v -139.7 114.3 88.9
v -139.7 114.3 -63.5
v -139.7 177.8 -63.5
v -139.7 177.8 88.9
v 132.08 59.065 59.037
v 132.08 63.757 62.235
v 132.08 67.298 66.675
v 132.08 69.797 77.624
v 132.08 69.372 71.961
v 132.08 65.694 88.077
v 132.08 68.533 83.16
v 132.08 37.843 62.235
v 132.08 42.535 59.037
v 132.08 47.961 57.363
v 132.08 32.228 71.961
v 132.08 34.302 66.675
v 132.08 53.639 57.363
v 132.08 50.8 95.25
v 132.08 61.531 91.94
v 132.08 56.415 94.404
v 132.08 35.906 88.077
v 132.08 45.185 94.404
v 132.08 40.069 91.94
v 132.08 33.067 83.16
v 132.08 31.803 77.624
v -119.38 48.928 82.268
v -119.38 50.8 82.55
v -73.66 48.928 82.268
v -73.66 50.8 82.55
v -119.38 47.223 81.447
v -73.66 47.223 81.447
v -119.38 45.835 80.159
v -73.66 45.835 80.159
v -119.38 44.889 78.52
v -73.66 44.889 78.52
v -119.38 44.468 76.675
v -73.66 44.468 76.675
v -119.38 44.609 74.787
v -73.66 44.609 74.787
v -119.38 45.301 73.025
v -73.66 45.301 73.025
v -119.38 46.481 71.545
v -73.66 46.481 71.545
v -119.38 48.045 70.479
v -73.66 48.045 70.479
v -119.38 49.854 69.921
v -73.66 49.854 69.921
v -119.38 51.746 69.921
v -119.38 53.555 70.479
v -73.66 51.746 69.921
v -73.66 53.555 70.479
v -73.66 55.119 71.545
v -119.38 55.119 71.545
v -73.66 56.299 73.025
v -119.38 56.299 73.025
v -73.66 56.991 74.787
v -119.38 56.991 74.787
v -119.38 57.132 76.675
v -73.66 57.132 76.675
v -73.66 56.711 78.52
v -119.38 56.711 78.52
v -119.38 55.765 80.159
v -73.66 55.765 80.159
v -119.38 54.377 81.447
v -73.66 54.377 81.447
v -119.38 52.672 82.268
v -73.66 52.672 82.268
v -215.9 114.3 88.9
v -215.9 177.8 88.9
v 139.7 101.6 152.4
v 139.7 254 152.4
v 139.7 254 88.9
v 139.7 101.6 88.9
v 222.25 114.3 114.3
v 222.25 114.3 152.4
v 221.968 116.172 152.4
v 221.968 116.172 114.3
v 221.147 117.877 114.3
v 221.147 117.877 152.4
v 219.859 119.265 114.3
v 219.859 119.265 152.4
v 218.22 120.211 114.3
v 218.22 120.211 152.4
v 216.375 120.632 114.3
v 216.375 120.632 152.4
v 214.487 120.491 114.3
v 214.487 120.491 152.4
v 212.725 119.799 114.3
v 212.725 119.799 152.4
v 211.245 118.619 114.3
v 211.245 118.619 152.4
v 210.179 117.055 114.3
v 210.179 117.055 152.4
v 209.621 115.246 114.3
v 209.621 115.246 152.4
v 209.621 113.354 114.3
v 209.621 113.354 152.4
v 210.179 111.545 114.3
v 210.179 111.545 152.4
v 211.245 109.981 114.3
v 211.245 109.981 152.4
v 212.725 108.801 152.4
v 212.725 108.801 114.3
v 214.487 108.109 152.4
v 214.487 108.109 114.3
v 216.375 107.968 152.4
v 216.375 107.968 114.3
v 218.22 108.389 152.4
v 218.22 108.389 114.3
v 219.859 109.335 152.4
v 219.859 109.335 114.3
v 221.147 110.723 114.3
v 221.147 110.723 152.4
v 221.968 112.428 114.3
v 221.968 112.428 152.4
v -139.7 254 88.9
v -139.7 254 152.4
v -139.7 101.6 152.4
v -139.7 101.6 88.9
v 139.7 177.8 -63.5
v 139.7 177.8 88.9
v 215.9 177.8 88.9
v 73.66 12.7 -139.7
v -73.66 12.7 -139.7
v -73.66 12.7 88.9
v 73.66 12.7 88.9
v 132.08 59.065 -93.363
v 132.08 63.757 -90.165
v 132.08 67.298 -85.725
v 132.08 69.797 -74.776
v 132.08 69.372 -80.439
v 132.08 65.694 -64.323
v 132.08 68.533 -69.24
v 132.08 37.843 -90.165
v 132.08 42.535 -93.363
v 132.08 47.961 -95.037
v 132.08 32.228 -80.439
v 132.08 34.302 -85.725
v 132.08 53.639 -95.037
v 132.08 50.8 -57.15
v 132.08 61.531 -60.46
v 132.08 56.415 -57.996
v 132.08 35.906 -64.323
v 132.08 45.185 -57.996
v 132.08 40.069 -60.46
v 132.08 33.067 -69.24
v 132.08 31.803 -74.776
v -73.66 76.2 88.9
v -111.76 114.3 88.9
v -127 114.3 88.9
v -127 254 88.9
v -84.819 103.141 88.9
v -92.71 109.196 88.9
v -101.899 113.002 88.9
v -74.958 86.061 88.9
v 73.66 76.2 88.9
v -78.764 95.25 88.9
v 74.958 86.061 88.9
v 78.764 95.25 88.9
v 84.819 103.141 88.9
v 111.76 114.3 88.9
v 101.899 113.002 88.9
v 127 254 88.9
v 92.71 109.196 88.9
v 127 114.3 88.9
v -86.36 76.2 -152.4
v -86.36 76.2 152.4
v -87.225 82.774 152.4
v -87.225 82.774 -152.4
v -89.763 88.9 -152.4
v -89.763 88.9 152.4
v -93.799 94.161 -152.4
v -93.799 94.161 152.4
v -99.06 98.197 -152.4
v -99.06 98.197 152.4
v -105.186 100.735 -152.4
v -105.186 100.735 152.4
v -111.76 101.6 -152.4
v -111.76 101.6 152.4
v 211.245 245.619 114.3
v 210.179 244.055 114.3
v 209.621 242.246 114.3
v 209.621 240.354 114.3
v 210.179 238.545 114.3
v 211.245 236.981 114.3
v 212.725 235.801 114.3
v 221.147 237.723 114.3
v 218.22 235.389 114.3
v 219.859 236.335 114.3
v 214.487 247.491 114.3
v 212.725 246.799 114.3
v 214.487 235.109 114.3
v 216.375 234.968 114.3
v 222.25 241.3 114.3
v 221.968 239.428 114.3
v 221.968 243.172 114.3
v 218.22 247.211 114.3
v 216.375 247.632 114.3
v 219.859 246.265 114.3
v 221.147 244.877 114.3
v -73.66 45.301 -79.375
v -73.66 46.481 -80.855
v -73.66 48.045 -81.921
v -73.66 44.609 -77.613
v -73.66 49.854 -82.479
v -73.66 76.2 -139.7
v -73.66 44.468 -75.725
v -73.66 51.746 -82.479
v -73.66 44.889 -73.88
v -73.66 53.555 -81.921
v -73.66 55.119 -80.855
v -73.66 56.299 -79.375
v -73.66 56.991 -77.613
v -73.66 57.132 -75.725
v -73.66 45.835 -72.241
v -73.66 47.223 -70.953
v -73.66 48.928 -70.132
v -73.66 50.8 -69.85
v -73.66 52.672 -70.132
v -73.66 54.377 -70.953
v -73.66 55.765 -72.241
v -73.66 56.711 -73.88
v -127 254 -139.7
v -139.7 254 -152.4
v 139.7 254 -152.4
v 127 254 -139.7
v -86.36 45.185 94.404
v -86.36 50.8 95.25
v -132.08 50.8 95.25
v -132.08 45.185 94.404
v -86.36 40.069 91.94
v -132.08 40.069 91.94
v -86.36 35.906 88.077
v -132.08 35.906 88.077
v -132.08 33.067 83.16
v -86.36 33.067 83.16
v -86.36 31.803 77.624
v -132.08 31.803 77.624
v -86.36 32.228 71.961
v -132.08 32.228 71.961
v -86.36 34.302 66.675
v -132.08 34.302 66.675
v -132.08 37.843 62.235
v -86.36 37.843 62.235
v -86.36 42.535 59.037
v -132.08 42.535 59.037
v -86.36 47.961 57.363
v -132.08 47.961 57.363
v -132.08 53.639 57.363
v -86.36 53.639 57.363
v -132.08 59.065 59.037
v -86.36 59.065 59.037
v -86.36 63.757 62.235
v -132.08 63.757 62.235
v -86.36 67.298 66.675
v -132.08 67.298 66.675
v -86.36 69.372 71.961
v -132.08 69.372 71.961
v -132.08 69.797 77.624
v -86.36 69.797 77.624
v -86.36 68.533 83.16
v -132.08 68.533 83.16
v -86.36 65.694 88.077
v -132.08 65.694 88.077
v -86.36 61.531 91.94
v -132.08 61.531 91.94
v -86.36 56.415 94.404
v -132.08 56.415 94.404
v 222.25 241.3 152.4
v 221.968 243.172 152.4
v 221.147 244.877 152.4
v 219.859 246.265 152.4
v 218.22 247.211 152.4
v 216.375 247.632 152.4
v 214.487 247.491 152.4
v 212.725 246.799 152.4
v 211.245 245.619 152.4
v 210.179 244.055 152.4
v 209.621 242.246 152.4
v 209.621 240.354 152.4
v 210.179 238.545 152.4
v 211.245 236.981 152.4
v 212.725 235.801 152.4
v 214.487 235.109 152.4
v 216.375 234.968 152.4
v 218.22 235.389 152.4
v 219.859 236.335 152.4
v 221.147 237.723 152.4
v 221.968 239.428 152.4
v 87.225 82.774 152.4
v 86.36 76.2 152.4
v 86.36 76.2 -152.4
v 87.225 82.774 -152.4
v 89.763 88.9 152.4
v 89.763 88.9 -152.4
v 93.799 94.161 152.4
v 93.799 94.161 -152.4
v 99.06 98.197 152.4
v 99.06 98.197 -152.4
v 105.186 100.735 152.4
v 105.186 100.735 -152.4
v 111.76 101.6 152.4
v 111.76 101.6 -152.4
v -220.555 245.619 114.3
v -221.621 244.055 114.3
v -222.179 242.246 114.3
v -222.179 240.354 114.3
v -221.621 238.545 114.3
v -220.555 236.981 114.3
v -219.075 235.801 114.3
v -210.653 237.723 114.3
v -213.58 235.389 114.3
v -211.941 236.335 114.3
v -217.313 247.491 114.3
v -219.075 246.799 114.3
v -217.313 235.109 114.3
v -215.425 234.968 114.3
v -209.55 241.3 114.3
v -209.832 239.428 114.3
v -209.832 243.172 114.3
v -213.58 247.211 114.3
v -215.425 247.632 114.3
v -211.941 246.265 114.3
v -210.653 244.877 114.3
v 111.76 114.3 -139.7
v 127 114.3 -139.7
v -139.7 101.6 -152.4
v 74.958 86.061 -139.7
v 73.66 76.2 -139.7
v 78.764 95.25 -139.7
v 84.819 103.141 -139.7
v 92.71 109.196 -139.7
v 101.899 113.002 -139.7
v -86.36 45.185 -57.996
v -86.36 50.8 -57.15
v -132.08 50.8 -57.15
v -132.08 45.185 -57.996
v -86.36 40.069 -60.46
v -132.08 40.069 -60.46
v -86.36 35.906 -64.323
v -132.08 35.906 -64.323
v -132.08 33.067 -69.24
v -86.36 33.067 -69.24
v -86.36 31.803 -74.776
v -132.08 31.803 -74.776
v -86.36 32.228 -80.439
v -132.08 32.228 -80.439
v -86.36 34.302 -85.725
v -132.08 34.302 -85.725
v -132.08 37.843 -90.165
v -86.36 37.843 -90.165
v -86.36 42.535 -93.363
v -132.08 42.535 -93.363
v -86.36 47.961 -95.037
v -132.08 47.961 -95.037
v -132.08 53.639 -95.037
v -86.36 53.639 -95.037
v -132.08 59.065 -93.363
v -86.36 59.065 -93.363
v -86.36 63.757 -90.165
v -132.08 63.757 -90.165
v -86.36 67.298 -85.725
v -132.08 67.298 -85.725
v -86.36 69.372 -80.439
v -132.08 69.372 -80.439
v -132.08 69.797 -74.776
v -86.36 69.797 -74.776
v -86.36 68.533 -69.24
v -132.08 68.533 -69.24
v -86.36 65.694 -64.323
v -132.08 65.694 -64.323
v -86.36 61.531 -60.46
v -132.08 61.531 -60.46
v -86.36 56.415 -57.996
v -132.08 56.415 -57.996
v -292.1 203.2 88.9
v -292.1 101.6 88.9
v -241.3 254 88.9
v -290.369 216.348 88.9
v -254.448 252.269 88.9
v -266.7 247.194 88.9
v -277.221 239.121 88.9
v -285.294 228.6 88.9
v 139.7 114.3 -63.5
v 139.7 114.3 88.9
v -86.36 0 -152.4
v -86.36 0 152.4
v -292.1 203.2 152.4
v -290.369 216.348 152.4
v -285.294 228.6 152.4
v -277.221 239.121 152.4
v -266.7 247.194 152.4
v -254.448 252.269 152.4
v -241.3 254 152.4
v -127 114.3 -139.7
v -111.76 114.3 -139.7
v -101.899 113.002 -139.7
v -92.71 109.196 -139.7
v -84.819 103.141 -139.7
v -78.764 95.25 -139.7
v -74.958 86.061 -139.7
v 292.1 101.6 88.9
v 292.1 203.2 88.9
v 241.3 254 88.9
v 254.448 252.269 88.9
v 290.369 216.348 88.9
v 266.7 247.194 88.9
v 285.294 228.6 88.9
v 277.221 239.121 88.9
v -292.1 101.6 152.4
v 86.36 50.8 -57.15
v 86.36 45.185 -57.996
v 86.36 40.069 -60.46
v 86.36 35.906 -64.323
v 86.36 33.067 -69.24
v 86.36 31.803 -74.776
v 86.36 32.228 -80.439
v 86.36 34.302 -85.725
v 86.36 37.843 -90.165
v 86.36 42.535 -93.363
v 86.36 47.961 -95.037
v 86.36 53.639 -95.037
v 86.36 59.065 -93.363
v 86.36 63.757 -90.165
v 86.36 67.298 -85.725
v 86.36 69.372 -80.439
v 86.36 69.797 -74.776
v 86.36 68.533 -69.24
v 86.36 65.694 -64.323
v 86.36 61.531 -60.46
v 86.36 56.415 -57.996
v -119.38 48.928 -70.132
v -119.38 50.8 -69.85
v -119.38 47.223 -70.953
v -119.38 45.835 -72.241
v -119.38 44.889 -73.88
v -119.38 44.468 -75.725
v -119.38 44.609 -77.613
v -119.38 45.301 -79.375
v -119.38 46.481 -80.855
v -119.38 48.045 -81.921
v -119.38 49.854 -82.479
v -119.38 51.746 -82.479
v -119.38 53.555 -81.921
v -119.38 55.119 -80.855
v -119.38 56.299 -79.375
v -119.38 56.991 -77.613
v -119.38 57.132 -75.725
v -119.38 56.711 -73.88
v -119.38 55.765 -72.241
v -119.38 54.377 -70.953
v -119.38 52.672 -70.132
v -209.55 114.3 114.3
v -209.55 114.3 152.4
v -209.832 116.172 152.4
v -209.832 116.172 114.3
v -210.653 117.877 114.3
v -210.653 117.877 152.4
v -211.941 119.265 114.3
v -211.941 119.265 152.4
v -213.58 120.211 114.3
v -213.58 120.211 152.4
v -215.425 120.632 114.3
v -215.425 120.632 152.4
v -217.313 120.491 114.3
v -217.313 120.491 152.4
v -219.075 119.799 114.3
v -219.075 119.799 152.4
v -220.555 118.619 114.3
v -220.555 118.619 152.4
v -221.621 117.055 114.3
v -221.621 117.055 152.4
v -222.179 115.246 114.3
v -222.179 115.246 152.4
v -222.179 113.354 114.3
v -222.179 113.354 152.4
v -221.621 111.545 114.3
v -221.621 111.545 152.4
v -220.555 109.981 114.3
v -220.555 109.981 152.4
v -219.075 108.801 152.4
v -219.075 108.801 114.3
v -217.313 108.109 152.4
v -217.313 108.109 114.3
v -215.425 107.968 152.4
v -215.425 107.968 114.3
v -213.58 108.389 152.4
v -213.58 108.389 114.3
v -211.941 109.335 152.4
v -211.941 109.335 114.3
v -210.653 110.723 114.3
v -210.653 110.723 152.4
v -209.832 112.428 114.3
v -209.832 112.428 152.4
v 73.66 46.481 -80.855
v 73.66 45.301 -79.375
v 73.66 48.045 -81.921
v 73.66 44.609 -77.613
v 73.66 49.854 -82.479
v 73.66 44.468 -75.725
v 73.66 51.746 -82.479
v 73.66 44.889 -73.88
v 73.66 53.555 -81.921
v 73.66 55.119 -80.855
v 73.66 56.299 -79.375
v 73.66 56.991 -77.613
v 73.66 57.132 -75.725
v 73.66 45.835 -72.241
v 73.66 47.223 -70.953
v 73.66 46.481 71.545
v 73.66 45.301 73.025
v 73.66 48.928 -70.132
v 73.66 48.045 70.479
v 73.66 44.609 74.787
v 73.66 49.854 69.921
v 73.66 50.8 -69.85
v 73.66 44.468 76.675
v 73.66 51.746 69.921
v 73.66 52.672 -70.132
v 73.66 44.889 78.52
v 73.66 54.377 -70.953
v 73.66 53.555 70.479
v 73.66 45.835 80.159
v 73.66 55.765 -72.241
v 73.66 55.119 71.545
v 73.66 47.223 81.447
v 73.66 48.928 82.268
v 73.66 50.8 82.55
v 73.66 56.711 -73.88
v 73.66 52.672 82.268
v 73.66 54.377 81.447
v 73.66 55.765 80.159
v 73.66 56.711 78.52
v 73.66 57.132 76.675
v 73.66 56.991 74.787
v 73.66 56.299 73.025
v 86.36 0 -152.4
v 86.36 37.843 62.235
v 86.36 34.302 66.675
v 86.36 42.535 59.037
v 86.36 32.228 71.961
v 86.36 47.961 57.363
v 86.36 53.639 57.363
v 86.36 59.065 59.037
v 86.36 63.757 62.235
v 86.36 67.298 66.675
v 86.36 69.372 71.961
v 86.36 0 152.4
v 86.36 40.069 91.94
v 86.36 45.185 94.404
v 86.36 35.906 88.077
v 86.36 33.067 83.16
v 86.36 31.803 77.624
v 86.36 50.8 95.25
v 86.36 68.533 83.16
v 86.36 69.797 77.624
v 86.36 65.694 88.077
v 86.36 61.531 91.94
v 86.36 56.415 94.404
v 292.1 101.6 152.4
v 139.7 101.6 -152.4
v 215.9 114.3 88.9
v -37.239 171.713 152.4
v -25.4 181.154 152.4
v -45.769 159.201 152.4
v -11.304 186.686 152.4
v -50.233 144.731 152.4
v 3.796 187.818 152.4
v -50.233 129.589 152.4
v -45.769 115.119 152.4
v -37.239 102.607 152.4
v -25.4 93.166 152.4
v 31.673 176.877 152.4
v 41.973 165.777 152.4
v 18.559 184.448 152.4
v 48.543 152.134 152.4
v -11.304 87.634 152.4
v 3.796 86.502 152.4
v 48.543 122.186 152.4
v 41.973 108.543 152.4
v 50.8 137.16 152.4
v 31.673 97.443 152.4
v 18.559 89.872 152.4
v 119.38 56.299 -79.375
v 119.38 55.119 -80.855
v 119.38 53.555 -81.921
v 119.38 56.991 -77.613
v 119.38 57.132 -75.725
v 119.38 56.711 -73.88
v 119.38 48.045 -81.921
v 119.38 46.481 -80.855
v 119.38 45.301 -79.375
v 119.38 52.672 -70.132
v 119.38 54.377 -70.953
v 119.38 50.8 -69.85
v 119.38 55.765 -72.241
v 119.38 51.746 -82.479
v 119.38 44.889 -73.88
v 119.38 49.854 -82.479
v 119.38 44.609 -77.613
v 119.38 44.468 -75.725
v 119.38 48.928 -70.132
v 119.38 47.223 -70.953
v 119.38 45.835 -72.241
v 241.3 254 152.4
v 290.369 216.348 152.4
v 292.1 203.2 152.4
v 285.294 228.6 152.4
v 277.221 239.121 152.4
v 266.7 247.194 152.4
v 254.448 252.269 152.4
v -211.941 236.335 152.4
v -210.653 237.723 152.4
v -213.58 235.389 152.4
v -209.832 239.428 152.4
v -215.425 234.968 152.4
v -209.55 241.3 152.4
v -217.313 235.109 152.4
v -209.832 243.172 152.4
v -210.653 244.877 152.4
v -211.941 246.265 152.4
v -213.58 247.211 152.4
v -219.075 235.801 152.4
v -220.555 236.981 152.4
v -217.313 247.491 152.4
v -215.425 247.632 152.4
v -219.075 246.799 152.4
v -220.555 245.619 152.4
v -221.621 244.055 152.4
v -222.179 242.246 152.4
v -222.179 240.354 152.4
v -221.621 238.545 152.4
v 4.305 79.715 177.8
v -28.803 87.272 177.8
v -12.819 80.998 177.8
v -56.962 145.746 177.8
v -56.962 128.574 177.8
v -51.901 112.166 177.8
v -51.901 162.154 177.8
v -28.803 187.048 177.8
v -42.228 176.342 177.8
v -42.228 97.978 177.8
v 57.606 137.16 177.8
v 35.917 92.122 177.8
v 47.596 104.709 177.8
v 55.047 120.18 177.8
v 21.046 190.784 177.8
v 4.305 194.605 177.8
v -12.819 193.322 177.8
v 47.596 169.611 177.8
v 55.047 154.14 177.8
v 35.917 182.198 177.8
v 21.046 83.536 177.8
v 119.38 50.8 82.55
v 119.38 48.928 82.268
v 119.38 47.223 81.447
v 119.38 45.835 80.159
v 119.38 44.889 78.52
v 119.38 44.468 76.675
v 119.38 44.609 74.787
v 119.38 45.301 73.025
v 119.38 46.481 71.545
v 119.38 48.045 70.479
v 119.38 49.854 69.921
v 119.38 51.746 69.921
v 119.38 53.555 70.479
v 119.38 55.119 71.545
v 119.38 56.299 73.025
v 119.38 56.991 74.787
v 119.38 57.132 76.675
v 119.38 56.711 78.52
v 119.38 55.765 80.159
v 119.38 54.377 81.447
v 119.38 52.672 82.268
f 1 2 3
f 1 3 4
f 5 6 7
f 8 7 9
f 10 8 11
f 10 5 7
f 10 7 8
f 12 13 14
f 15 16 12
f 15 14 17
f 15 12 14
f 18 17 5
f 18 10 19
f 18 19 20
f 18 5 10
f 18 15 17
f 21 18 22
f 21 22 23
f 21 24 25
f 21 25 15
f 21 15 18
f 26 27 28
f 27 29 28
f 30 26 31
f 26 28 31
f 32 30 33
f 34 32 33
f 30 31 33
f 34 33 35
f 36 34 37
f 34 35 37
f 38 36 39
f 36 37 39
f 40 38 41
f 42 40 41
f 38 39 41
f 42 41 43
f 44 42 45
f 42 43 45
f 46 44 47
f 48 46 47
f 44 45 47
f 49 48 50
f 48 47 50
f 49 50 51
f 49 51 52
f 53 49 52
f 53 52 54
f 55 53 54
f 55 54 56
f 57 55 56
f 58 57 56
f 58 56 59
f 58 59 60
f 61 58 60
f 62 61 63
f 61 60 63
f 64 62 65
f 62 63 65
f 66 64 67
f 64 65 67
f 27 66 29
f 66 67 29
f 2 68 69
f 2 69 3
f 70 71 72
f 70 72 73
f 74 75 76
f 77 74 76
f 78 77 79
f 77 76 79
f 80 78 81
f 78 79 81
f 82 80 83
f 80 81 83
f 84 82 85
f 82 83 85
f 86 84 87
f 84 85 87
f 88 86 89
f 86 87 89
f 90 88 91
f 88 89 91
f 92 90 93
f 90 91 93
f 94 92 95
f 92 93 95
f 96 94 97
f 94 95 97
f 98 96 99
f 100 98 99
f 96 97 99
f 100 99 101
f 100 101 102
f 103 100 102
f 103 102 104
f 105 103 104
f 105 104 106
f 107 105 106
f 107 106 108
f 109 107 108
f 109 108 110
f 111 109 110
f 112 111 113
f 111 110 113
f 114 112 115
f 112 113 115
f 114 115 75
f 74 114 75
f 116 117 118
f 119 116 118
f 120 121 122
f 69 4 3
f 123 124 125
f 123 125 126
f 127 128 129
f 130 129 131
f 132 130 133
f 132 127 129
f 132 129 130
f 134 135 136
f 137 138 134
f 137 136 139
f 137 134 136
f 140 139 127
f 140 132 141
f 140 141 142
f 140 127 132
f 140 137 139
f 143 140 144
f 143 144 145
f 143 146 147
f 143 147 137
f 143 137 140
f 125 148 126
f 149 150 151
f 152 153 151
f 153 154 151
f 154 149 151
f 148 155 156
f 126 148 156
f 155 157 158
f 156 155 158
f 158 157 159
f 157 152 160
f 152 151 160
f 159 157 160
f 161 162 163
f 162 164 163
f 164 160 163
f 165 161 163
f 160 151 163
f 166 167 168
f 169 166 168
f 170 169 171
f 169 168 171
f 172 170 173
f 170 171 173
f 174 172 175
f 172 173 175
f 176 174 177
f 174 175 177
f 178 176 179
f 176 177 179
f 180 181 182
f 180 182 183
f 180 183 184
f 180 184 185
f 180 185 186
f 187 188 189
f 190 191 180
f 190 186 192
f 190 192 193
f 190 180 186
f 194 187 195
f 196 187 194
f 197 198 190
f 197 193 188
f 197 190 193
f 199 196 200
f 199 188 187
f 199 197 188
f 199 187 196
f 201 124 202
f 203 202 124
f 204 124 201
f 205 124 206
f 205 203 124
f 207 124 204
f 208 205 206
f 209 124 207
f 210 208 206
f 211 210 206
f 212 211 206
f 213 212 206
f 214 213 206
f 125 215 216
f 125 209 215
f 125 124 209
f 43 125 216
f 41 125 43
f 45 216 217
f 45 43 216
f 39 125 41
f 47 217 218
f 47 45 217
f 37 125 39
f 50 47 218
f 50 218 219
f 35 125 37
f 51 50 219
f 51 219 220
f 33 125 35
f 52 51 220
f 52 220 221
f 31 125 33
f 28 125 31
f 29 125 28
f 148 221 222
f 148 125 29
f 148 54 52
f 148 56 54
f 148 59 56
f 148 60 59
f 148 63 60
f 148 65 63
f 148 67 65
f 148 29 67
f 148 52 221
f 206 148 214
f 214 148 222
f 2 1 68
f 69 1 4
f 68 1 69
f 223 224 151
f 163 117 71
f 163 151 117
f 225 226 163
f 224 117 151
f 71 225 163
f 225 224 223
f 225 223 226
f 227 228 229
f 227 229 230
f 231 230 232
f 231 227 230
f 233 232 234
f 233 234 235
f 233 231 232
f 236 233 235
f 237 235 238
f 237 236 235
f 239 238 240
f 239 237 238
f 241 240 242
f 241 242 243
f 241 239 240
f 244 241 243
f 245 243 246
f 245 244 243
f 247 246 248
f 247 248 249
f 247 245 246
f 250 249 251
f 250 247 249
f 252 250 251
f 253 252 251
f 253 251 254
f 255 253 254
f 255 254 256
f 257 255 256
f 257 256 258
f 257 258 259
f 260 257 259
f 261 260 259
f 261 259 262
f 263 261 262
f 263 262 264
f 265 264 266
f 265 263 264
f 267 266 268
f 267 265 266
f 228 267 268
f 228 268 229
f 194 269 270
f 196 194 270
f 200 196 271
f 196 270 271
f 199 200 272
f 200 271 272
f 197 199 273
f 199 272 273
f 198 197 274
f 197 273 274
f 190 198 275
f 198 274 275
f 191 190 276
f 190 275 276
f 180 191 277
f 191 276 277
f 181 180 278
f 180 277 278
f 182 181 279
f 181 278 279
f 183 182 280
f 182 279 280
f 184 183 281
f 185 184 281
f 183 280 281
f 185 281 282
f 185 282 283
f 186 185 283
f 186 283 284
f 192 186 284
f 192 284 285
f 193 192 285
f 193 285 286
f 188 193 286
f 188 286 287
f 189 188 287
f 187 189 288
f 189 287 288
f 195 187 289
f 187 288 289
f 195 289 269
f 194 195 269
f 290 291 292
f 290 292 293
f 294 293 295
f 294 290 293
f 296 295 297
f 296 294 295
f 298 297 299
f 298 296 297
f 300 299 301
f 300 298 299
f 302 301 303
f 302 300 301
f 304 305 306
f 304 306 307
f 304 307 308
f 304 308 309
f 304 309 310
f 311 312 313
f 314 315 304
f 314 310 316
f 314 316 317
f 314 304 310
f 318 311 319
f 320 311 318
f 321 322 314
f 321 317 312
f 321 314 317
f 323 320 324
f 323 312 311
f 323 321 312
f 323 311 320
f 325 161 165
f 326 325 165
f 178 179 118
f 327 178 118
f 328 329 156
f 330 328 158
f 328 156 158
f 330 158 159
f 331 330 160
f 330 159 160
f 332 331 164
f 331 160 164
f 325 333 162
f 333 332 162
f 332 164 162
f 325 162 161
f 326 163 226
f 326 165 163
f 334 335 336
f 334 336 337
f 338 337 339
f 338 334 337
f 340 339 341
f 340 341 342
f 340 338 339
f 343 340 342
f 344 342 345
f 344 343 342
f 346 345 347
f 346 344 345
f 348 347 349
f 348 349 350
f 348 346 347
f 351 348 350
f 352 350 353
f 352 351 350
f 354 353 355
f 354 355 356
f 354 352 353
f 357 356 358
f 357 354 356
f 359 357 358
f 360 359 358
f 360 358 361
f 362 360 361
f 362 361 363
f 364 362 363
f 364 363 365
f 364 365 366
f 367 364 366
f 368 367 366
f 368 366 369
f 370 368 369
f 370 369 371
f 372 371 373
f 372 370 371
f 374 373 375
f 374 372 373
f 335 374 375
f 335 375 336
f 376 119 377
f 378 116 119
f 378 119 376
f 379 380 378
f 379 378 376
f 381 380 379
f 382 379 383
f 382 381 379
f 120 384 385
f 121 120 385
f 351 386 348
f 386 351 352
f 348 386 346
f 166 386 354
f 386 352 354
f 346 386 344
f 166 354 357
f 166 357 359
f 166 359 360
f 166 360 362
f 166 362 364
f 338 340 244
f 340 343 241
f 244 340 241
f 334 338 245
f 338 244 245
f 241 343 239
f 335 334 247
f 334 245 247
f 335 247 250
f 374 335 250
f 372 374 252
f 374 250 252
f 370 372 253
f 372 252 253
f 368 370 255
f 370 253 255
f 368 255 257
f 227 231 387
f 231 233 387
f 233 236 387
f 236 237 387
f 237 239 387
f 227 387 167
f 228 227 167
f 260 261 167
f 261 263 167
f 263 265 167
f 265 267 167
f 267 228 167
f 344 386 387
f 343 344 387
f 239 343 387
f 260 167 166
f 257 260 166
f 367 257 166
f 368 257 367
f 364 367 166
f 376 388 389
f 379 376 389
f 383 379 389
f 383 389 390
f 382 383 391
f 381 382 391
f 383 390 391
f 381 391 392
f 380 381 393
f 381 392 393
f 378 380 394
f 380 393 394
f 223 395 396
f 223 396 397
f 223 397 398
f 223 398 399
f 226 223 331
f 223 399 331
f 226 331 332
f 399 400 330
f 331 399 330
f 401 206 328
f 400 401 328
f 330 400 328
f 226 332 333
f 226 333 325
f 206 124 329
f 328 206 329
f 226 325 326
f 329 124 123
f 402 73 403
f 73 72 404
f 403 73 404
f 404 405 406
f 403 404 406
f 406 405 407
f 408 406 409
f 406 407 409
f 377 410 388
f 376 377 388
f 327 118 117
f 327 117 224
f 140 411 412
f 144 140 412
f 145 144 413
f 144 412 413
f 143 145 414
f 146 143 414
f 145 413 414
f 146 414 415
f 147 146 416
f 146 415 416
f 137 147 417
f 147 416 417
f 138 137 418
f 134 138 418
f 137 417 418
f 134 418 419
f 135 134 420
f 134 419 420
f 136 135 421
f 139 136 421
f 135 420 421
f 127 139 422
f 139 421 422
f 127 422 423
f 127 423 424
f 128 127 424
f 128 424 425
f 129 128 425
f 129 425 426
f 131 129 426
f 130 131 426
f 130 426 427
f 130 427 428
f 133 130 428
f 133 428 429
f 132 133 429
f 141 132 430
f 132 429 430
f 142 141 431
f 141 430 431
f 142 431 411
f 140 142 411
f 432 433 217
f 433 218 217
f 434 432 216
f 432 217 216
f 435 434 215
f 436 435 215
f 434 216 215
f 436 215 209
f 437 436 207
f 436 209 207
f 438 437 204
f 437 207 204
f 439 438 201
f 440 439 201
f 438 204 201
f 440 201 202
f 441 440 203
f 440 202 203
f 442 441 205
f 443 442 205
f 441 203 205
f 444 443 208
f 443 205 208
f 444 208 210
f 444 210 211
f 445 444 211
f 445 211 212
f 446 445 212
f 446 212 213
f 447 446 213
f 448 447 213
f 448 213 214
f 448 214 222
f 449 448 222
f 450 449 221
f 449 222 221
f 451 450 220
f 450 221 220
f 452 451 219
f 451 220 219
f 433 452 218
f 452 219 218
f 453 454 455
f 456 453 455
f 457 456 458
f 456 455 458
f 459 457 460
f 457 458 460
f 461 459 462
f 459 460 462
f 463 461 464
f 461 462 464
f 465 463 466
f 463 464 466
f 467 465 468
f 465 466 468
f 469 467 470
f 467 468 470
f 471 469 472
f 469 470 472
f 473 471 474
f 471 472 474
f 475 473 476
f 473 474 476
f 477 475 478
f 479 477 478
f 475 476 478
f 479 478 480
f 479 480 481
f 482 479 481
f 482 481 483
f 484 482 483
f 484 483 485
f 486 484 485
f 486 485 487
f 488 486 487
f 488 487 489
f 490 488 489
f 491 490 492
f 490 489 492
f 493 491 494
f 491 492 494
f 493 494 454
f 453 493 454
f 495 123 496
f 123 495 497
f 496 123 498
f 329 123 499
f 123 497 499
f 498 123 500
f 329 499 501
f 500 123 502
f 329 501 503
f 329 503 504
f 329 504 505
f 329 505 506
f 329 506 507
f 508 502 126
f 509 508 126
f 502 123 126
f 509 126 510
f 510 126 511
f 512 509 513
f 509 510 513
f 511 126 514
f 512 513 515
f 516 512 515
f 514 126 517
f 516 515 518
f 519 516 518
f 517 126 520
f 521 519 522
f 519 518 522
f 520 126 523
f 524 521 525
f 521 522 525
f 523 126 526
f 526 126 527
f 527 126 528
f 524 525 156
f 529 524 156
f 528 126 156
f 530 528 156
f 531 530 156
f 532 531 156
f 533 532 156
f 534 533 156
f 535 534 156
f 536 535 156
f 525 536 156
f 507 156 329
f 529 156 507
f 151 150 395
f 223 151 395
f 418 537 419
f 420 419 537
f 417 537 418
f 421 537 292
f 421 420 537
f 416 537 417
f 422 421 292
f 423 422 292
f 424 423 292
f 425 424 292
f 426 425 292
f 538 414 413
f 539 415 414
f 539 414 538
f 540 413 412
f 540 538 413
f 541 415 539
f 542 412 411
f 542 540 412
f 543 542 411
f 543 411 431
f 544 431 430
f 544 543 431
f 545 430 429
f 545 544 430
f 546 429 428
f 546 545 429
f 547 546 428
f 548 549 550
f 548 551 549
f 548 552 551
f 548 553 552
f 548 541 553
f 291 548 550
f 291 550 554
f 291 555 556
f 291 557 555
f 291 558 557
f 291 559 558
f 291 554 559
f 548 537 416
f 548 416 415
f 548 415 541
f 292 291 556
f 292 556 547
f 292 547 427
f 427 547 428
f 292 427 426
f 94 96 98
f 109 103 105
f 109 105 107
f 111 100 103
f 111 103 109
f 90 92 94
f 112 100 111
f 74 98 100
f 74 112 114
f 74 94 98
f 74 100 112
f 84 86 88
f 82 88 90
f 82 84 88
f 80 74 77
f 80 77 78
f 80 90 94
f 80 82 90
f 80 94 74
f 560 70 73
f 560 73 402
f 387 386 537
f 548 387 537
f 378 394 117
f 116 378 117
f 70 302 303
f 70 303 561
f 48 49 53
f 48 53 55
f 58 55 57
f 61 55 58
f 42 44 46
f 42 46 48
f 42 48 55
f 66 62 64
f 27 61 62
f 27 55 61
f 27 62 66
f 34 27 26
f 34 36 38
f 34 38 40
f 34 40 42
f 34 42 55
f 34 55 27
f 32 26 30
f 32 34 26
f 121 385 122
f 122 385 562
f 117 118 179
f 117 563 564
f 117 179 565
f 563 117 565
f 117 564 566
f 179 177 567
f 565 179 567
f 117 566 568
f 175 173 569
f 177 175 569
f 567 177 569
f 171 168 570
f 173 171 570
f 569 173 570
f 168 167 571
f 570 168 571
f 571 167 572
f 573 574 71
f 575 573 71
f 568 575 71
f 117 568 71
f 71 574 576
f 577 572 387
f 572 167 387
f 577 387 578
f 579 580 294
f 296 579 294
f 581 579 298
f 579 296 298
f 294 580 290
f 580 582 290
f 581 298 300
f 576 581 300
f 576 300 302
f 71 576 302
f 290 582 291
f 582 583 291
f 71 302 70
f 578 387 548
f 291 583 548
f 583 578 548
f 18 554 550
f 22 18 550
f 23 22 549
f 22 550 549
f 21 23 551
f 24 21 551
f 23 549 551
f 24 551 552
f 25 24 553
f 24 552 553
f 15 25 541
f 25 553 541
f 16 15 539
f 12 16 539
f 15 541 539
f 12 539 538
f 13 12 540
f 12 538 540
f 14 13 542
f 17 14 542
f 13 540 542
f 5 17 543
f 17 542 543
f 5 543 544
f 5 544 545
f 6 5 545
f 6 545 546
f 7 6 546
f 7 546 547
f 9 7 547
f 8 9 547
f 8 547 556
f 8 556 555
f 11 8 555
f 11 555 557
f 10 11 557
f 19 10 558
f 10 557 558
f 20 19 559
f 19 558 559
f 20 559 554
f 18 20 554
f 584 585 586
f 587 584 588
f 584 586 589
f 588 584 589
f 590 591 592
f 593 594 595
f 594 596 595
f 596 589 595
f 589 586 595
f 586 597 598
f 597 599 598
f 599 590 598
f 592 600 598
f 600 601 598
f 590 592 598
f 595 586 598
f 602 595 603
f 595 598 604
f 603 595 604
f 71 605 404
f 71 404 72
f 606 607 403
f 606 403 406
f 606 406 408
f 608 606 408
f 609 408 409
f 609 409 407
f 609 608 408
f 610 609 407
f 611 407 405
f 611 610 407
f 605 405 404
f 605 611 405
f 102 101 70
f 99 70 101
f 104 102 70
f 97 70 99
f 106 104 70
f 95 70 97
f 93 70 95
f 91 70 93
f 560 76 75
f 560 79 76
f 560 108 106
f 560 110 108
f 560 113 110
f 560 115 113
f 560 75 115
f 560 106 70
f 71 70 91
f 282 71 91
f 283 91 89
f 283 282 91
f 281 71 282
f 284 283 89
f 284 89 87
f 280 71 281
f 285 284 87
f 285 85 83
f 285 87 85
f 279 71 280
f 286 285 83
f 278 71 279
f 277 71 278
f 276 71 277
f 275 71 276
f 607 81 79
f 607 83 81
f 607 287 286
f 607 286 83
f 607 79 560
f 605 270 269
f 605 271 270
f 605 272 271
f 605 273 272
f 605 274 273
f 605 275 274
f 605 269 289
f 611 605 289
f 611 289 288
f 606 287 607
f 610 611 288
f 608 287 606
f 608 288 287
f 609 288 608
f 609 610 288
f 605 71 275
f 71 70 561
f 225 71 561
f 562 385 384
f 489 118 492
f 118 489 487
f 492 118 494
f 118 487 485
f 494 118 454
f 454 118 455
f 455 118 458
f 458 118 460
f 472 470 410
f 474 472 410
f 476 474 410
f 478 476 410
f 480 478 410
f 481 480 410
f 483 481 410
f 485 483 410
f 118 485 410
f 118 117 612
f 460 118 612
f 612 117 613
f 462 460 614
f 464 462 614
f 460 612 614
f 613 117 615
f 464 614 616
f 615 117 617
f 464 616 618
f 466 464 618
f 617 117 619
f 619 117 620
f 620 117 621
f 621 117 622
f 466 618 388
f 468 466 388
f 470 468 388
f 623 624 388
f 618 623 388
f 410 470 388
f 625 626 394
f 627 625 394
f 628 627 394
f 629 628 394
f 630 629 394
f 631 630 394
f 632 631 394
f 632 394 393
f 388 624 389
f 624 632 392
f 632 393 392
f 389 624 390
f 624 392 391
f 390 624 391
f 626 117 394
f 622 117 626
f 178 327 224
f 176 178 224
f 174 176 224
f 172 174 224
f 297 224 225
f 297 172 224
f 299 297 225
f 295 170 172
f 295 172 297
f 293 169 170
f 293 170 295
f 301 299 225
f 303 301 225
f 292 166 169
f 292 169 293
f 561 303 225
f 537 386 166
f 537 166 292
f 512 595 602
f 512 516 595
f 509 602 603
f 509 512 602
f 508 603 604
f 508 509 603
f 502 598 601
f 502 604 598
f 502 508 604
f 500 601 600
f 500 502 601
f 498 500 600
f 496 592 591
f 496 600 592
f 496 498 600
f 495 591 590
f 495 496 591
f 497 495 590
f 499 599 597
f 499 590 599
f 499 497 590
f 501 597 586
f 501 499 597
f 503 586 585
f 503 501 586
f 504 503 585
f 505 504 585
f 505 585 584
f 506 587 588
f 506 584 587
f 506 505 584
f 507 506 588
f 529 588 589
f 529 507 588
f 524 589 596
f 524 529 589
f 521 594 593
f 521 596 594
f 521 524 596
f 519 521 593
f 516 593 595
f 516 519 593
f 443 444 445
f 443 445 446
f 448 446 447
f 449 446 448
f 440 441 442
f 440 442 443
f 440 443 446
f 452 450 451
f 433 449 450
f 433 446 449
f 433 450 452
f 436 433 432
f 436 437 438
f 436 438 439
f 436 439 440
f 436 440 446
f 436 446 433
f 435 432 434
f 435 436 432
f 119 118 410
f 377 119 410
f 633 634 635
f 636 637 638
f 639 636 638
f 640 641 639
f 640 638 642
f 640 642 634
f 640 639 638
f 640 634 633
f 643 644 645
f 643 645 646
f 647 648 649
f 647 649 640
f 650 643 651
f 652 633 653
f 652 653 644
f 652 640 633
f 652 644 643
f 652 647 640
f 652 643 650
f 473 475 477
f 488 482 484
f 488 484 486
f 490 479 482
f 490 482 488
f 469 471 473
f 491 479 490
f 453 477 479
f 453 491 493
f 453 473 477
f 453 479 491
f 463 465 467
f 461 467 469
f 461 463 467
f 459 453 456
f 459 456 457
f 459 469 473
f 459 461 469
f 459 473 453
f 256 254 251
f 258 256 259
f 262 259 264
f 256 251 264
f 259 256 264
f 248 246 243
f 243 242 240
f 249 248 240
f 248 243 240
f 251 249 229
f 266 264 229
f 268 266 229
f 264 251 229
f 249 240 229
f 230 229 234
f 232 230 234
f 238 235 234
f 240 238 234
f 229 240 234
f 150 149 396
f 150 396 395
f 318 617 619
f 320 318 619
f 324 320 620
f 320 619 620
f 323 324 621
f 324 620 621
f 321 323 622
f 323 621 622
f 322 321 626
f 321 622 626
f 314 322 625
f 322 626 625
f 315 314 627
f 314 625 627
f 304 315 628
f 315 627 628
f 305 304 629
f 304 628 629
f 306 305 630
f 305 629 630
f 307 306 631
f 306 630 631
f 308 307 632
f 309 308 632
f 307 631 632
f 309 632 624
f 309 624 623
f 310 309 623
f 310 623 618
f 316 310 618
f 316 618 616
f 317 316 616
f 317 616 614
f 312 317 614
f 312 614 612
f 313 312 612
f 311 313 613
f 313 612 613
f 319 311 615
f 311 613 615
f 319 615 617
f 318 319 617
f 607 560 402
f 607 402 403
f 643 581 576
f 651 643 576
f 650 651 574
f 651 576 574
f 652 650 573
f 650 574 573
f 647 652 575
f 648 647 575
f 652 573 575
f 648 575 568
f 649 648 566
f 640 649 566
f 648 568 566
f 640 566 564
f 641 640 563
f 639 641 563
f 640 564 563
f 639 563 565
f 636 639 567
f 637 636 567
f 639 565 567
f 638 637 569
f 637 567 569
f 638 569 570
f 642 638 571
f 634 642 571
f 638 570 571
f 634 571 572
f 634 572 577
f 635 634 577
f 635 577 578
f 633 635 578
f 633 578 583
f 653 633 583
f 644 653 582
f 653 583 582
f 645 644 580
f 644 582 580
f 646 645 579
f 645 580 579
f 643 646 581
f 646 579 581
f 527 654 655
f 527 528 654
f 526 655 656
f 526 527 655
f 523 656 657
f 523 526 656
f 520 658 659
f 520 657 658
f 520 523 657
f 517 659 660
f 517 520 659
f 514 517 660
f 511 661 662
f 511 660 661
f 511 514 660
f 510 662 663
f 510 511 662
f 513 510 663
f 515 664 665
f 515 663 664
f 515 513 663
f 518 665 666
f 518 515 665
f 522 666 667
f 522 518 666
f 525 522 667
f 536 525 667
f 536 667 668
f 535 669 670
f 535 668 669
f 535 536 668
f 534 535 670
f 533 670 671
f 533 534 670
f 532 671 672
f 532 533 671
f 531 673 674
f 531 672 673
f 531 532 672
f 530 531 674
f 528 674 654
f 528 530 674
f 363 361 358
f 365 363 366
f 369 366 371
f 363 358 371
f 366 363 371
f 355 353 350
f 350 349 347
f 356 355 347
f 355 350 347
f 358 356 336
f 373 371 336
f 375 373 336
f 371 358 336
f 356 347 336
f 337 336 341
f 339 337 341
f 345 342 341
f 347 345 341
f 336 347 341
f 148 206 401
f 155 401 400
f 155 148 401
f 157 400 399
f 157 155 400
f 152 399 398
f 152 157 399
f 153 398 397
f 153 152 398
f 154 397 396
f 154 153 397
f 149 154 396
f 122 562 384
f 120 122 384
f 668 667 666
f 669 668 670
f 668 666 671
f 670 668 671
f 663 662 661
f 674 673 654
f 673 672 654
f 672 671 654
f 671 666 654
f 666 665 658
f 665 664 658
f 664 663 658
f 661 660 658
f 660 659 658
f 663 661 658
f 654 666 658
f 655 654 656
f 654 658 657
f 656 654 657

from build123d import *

# Parameters (mm, degrees)
SKETCH1_W           = 279.4
SKETCH1_H           = 304.8
BOSS_EXTRUDE1_DEPTH = 254
CUT_EXTRUDE2_REACH  = 422.637
SKETCH6_R           = 19.05
BOSS_EXTRUDE4_DEPTH = 45.72
SHELL3_T            = -12.7
SKETCH2_R           = 50.8
BOSS_EXTRUDE2_DEPTH = 25.4
BOSS_EXTRUDE2_DRAFT = -15
BOSS_EXTRUDE6_REACH = 342.066
SKETCH11_W          = 279.4
SKETCH11_H          = 63.5
BOSS_EXTRUDE7_DEPTH = 63.5
GUSSET1_START       = 114.3
GUSSET1_DEPTH       = 63.5
SKETCH16_R          = 6.35
CUT_EXTRUDE4_DEPTH  = 38.1
SKETCH17_R          = 6.35
CUT_EXTRUDE5_DEPTH  = 38.1


# Read off the part's stored shape, not the designer's step: Gusset1
with BuildPart() as part:
    # Sketch1 → Boss-Extrude1 (new body)
    with BuildSketch(Plane(origin=(0, 0, 0), x_dir=(1, 0, 0), z_dir=(0, 1, 0))):
        Rectangle(SKETCH1_W, SKETCH1_H)
    extrude(amount=BOSS_EXTRUDE1_DEPTH)

    # Sketch5 → Cut-Extrude2 (cut, up to next)
    with BuildSketch(Plane.XY.offset(152.4), mode=Mode.PRIVATE) as cut_extrude2_sk1:
        with BuildLine():
            Line((86.36, 0), (86.36, 76.2))
            ThreePointArc((86.36, 76.2), (93.799487758, 94.160512242), (111.76, 101.6))
            Line((111.76, 101.6), (139.7, 101.6))
            Line((139.7, 101.6), (139.7, 0))
            Line((139.7, 0), (86.36, 0))
        make_face()
    cut_extrude2_tool1 = extrude(cut_extrude2_sk1.sketch, amount=-CUT_EXTRUDE2_REACH, mode=Mode.PRIVATE) & part.part
    cut_extrude2 = cut_extrude2_tool1.solids().sort_by_distance((113.580478, 49.616891, 152.4))[0]
    add(cut_extrude2, mode=Mode.SUBTRACT)

    # Mirror17: Cut-Extrude2 across plane
    add(cut_extrude2.mirror(Plane(origin=(0, 0, 0), x_dir=(0, 0, 1), z_dir=(1, 0, 0))), mode=Mode.SUBTRACT)

    # Sketch6 → Boss-Extrude4 (add)
    with BuildSketch(Plane(origin=(86.36, 0, 0), x_dir=(0, 0, -1), z_dir=(1, 0, 0))):
        with Locations(Location((-76.2, 50.8, 0), (0, 0, 180))):
            Circle(SKETCH6_R)
        with Locations(Location((76.2, 50.8, 0), (0, 0, 180))):
            Circle(SKETCH6_R)
    boss_extrude4 = extrude(amount=BOSS_EXTRUDE4_DEPTH)

    # Mirror18: Boss-Extrude4 across plane
    add(boss_extrude4.mirror(Plane(origin=(0, 0, 0), x_dir=(0, 0, 1), z_dir=(1, 0, 0))))

    # Shell3
    shell3_openings = [part.faces().sort_by_distance(p)[0] for p in [
        (0, 254, 0),
    ]]
    offset(amount=SHELL3_T, openings=shell3_openings, kind=Kind.INTERSECTION)


with BuildPart() as boss_extrude2_tool:
    # Sketch2 → Boss-Extrude2 (with draft: the straight prism first)
    with BuildSketch(Plane.XY.offset(152.4)):
        with Locations((0, 137.16)):
            Circle(SKETCH2_R)
    extrude(amount=BOSS_EXTRUDE2_DEPTH)
    # Boss-Extrude2: the draft: its side faces are tilted about the plane it starts from
    boss_extrude2_sides = [boss_extrude2_tool.faces().sort_by_distance(p)[0] for p in [
        (-50.8, 137.16, 165.1),
    ]]
    draft(boss_extrude2_sides, Plane.XY.offset(152.4), BOSS_EXTRUDE2_DRAFT)


with BuildPart() as part_1:
    add(part.part)

    # Boss-Extrude2: add boss_extrude2_tool
    add(boss_extrude2_tool.part)

    # Sketch11 → Boss-Extrude6 (add, up to next)
    with BuildSketch(Plane(origin=(0, 254, 0), x_dir=(1, 0, 0), z_dir=(0, 1, 0)), mode=Mode.PRIVATE) as boss_extrude6_sk1:
        with Locations((0, -120.65)):
            Rectangle(SKETCH11_W, SKETCH11_H)
    boss_extrude6_tool1 = extrude(boss_extrude6_sk1.sketch, amount=-BOSS_EXTRUDE6_REACH, mode=Mode.PRIVATE) - part_1.part
    add(boss_extrude6_tool1.solids().sort_by_distance((0, 254, 120.65))[0])


with BuildPart() as body_2:
    # Sketch12 → Boss-Extrude7 (new body)
    with BuildSketch(Plane.XY.offset(152.4)):
        with BuildLine():
            Line((139.7, 254), (139.7, 101.6))
            Line((139.7, 101.6), (292.1, 101.6))
            Line((292.1, 101.6), (292.1, 203.2))
            ThreePointArc((292.1, 203.2), (277.221024484, 239.121024484), (241.3, 254))
            Line((241.3, 254), (139.7, 254))
        make_face()
    extrude(amount=-BOSS_EXTRUDE7_DEPTH)


with BuildPart() as body_3:
    # Mirror7: mirrored copy
    add(body_2.part.mirror(Plane(origin=(0, 0, 0), x_dir=(0, 0, 1), z_dir=(1, 0, 0))))

    # Sketch17 → Cut-Extrude5 (cut)
    with BuildSketch(Plane.XY.offset(152.4)):
        with Locations((-215.9, 241.3)):
            Circle(SKETCH17_R)
        with Locations((-215.9, 114.3)):
            Circle(SKETCH17_R)
    extrude(amount=-CUT_EXTRUDE5_DEPTH, mode=Mode.SUBTRACT)


with BuildPart() as body_4:
    # Gusset1 outline → Gusset1 (new body)
    with BuildSketch(Plane(origin=(0, 0, 0), x_dir=(1, 0, 0), z_dir=(0, 1, 0)).offset(GUSSET1_START)):
        Polygon((215.9, -88.9), (139.7, 63.5), (139.7, -88.9), align=None)
    extrude(amount=GUSSET1_DEPTH)


with BuildPart() as body_2_1:
    add(body_2.part)

    # Sketch16 → Cut-Extrude4 (cut)
    with BuildSketch(Plane.XY.offset(152.4)):
        with Locations((215.9, 114.3)):
            Circle(SKETCH16_R)
        with Locations((215.9, 241.3)):
            Circle(SKETCH16_R)
    extrude(amount=-CUT_EXTRUDE4_DEPTH, mode=Mode.SUBTRACT)


with BuildPart() as body_5:
    # Mirror13: mirrored copy
    add(body_4.part.mirror(Plane(origin=(0, 0, 0), x_dir=(0, 0, 1), z_dir=(1, 0, 0))))


solid = Compound([part_1.part, body_3.part, body_4.part, body_2_1.part, body_5.part])
